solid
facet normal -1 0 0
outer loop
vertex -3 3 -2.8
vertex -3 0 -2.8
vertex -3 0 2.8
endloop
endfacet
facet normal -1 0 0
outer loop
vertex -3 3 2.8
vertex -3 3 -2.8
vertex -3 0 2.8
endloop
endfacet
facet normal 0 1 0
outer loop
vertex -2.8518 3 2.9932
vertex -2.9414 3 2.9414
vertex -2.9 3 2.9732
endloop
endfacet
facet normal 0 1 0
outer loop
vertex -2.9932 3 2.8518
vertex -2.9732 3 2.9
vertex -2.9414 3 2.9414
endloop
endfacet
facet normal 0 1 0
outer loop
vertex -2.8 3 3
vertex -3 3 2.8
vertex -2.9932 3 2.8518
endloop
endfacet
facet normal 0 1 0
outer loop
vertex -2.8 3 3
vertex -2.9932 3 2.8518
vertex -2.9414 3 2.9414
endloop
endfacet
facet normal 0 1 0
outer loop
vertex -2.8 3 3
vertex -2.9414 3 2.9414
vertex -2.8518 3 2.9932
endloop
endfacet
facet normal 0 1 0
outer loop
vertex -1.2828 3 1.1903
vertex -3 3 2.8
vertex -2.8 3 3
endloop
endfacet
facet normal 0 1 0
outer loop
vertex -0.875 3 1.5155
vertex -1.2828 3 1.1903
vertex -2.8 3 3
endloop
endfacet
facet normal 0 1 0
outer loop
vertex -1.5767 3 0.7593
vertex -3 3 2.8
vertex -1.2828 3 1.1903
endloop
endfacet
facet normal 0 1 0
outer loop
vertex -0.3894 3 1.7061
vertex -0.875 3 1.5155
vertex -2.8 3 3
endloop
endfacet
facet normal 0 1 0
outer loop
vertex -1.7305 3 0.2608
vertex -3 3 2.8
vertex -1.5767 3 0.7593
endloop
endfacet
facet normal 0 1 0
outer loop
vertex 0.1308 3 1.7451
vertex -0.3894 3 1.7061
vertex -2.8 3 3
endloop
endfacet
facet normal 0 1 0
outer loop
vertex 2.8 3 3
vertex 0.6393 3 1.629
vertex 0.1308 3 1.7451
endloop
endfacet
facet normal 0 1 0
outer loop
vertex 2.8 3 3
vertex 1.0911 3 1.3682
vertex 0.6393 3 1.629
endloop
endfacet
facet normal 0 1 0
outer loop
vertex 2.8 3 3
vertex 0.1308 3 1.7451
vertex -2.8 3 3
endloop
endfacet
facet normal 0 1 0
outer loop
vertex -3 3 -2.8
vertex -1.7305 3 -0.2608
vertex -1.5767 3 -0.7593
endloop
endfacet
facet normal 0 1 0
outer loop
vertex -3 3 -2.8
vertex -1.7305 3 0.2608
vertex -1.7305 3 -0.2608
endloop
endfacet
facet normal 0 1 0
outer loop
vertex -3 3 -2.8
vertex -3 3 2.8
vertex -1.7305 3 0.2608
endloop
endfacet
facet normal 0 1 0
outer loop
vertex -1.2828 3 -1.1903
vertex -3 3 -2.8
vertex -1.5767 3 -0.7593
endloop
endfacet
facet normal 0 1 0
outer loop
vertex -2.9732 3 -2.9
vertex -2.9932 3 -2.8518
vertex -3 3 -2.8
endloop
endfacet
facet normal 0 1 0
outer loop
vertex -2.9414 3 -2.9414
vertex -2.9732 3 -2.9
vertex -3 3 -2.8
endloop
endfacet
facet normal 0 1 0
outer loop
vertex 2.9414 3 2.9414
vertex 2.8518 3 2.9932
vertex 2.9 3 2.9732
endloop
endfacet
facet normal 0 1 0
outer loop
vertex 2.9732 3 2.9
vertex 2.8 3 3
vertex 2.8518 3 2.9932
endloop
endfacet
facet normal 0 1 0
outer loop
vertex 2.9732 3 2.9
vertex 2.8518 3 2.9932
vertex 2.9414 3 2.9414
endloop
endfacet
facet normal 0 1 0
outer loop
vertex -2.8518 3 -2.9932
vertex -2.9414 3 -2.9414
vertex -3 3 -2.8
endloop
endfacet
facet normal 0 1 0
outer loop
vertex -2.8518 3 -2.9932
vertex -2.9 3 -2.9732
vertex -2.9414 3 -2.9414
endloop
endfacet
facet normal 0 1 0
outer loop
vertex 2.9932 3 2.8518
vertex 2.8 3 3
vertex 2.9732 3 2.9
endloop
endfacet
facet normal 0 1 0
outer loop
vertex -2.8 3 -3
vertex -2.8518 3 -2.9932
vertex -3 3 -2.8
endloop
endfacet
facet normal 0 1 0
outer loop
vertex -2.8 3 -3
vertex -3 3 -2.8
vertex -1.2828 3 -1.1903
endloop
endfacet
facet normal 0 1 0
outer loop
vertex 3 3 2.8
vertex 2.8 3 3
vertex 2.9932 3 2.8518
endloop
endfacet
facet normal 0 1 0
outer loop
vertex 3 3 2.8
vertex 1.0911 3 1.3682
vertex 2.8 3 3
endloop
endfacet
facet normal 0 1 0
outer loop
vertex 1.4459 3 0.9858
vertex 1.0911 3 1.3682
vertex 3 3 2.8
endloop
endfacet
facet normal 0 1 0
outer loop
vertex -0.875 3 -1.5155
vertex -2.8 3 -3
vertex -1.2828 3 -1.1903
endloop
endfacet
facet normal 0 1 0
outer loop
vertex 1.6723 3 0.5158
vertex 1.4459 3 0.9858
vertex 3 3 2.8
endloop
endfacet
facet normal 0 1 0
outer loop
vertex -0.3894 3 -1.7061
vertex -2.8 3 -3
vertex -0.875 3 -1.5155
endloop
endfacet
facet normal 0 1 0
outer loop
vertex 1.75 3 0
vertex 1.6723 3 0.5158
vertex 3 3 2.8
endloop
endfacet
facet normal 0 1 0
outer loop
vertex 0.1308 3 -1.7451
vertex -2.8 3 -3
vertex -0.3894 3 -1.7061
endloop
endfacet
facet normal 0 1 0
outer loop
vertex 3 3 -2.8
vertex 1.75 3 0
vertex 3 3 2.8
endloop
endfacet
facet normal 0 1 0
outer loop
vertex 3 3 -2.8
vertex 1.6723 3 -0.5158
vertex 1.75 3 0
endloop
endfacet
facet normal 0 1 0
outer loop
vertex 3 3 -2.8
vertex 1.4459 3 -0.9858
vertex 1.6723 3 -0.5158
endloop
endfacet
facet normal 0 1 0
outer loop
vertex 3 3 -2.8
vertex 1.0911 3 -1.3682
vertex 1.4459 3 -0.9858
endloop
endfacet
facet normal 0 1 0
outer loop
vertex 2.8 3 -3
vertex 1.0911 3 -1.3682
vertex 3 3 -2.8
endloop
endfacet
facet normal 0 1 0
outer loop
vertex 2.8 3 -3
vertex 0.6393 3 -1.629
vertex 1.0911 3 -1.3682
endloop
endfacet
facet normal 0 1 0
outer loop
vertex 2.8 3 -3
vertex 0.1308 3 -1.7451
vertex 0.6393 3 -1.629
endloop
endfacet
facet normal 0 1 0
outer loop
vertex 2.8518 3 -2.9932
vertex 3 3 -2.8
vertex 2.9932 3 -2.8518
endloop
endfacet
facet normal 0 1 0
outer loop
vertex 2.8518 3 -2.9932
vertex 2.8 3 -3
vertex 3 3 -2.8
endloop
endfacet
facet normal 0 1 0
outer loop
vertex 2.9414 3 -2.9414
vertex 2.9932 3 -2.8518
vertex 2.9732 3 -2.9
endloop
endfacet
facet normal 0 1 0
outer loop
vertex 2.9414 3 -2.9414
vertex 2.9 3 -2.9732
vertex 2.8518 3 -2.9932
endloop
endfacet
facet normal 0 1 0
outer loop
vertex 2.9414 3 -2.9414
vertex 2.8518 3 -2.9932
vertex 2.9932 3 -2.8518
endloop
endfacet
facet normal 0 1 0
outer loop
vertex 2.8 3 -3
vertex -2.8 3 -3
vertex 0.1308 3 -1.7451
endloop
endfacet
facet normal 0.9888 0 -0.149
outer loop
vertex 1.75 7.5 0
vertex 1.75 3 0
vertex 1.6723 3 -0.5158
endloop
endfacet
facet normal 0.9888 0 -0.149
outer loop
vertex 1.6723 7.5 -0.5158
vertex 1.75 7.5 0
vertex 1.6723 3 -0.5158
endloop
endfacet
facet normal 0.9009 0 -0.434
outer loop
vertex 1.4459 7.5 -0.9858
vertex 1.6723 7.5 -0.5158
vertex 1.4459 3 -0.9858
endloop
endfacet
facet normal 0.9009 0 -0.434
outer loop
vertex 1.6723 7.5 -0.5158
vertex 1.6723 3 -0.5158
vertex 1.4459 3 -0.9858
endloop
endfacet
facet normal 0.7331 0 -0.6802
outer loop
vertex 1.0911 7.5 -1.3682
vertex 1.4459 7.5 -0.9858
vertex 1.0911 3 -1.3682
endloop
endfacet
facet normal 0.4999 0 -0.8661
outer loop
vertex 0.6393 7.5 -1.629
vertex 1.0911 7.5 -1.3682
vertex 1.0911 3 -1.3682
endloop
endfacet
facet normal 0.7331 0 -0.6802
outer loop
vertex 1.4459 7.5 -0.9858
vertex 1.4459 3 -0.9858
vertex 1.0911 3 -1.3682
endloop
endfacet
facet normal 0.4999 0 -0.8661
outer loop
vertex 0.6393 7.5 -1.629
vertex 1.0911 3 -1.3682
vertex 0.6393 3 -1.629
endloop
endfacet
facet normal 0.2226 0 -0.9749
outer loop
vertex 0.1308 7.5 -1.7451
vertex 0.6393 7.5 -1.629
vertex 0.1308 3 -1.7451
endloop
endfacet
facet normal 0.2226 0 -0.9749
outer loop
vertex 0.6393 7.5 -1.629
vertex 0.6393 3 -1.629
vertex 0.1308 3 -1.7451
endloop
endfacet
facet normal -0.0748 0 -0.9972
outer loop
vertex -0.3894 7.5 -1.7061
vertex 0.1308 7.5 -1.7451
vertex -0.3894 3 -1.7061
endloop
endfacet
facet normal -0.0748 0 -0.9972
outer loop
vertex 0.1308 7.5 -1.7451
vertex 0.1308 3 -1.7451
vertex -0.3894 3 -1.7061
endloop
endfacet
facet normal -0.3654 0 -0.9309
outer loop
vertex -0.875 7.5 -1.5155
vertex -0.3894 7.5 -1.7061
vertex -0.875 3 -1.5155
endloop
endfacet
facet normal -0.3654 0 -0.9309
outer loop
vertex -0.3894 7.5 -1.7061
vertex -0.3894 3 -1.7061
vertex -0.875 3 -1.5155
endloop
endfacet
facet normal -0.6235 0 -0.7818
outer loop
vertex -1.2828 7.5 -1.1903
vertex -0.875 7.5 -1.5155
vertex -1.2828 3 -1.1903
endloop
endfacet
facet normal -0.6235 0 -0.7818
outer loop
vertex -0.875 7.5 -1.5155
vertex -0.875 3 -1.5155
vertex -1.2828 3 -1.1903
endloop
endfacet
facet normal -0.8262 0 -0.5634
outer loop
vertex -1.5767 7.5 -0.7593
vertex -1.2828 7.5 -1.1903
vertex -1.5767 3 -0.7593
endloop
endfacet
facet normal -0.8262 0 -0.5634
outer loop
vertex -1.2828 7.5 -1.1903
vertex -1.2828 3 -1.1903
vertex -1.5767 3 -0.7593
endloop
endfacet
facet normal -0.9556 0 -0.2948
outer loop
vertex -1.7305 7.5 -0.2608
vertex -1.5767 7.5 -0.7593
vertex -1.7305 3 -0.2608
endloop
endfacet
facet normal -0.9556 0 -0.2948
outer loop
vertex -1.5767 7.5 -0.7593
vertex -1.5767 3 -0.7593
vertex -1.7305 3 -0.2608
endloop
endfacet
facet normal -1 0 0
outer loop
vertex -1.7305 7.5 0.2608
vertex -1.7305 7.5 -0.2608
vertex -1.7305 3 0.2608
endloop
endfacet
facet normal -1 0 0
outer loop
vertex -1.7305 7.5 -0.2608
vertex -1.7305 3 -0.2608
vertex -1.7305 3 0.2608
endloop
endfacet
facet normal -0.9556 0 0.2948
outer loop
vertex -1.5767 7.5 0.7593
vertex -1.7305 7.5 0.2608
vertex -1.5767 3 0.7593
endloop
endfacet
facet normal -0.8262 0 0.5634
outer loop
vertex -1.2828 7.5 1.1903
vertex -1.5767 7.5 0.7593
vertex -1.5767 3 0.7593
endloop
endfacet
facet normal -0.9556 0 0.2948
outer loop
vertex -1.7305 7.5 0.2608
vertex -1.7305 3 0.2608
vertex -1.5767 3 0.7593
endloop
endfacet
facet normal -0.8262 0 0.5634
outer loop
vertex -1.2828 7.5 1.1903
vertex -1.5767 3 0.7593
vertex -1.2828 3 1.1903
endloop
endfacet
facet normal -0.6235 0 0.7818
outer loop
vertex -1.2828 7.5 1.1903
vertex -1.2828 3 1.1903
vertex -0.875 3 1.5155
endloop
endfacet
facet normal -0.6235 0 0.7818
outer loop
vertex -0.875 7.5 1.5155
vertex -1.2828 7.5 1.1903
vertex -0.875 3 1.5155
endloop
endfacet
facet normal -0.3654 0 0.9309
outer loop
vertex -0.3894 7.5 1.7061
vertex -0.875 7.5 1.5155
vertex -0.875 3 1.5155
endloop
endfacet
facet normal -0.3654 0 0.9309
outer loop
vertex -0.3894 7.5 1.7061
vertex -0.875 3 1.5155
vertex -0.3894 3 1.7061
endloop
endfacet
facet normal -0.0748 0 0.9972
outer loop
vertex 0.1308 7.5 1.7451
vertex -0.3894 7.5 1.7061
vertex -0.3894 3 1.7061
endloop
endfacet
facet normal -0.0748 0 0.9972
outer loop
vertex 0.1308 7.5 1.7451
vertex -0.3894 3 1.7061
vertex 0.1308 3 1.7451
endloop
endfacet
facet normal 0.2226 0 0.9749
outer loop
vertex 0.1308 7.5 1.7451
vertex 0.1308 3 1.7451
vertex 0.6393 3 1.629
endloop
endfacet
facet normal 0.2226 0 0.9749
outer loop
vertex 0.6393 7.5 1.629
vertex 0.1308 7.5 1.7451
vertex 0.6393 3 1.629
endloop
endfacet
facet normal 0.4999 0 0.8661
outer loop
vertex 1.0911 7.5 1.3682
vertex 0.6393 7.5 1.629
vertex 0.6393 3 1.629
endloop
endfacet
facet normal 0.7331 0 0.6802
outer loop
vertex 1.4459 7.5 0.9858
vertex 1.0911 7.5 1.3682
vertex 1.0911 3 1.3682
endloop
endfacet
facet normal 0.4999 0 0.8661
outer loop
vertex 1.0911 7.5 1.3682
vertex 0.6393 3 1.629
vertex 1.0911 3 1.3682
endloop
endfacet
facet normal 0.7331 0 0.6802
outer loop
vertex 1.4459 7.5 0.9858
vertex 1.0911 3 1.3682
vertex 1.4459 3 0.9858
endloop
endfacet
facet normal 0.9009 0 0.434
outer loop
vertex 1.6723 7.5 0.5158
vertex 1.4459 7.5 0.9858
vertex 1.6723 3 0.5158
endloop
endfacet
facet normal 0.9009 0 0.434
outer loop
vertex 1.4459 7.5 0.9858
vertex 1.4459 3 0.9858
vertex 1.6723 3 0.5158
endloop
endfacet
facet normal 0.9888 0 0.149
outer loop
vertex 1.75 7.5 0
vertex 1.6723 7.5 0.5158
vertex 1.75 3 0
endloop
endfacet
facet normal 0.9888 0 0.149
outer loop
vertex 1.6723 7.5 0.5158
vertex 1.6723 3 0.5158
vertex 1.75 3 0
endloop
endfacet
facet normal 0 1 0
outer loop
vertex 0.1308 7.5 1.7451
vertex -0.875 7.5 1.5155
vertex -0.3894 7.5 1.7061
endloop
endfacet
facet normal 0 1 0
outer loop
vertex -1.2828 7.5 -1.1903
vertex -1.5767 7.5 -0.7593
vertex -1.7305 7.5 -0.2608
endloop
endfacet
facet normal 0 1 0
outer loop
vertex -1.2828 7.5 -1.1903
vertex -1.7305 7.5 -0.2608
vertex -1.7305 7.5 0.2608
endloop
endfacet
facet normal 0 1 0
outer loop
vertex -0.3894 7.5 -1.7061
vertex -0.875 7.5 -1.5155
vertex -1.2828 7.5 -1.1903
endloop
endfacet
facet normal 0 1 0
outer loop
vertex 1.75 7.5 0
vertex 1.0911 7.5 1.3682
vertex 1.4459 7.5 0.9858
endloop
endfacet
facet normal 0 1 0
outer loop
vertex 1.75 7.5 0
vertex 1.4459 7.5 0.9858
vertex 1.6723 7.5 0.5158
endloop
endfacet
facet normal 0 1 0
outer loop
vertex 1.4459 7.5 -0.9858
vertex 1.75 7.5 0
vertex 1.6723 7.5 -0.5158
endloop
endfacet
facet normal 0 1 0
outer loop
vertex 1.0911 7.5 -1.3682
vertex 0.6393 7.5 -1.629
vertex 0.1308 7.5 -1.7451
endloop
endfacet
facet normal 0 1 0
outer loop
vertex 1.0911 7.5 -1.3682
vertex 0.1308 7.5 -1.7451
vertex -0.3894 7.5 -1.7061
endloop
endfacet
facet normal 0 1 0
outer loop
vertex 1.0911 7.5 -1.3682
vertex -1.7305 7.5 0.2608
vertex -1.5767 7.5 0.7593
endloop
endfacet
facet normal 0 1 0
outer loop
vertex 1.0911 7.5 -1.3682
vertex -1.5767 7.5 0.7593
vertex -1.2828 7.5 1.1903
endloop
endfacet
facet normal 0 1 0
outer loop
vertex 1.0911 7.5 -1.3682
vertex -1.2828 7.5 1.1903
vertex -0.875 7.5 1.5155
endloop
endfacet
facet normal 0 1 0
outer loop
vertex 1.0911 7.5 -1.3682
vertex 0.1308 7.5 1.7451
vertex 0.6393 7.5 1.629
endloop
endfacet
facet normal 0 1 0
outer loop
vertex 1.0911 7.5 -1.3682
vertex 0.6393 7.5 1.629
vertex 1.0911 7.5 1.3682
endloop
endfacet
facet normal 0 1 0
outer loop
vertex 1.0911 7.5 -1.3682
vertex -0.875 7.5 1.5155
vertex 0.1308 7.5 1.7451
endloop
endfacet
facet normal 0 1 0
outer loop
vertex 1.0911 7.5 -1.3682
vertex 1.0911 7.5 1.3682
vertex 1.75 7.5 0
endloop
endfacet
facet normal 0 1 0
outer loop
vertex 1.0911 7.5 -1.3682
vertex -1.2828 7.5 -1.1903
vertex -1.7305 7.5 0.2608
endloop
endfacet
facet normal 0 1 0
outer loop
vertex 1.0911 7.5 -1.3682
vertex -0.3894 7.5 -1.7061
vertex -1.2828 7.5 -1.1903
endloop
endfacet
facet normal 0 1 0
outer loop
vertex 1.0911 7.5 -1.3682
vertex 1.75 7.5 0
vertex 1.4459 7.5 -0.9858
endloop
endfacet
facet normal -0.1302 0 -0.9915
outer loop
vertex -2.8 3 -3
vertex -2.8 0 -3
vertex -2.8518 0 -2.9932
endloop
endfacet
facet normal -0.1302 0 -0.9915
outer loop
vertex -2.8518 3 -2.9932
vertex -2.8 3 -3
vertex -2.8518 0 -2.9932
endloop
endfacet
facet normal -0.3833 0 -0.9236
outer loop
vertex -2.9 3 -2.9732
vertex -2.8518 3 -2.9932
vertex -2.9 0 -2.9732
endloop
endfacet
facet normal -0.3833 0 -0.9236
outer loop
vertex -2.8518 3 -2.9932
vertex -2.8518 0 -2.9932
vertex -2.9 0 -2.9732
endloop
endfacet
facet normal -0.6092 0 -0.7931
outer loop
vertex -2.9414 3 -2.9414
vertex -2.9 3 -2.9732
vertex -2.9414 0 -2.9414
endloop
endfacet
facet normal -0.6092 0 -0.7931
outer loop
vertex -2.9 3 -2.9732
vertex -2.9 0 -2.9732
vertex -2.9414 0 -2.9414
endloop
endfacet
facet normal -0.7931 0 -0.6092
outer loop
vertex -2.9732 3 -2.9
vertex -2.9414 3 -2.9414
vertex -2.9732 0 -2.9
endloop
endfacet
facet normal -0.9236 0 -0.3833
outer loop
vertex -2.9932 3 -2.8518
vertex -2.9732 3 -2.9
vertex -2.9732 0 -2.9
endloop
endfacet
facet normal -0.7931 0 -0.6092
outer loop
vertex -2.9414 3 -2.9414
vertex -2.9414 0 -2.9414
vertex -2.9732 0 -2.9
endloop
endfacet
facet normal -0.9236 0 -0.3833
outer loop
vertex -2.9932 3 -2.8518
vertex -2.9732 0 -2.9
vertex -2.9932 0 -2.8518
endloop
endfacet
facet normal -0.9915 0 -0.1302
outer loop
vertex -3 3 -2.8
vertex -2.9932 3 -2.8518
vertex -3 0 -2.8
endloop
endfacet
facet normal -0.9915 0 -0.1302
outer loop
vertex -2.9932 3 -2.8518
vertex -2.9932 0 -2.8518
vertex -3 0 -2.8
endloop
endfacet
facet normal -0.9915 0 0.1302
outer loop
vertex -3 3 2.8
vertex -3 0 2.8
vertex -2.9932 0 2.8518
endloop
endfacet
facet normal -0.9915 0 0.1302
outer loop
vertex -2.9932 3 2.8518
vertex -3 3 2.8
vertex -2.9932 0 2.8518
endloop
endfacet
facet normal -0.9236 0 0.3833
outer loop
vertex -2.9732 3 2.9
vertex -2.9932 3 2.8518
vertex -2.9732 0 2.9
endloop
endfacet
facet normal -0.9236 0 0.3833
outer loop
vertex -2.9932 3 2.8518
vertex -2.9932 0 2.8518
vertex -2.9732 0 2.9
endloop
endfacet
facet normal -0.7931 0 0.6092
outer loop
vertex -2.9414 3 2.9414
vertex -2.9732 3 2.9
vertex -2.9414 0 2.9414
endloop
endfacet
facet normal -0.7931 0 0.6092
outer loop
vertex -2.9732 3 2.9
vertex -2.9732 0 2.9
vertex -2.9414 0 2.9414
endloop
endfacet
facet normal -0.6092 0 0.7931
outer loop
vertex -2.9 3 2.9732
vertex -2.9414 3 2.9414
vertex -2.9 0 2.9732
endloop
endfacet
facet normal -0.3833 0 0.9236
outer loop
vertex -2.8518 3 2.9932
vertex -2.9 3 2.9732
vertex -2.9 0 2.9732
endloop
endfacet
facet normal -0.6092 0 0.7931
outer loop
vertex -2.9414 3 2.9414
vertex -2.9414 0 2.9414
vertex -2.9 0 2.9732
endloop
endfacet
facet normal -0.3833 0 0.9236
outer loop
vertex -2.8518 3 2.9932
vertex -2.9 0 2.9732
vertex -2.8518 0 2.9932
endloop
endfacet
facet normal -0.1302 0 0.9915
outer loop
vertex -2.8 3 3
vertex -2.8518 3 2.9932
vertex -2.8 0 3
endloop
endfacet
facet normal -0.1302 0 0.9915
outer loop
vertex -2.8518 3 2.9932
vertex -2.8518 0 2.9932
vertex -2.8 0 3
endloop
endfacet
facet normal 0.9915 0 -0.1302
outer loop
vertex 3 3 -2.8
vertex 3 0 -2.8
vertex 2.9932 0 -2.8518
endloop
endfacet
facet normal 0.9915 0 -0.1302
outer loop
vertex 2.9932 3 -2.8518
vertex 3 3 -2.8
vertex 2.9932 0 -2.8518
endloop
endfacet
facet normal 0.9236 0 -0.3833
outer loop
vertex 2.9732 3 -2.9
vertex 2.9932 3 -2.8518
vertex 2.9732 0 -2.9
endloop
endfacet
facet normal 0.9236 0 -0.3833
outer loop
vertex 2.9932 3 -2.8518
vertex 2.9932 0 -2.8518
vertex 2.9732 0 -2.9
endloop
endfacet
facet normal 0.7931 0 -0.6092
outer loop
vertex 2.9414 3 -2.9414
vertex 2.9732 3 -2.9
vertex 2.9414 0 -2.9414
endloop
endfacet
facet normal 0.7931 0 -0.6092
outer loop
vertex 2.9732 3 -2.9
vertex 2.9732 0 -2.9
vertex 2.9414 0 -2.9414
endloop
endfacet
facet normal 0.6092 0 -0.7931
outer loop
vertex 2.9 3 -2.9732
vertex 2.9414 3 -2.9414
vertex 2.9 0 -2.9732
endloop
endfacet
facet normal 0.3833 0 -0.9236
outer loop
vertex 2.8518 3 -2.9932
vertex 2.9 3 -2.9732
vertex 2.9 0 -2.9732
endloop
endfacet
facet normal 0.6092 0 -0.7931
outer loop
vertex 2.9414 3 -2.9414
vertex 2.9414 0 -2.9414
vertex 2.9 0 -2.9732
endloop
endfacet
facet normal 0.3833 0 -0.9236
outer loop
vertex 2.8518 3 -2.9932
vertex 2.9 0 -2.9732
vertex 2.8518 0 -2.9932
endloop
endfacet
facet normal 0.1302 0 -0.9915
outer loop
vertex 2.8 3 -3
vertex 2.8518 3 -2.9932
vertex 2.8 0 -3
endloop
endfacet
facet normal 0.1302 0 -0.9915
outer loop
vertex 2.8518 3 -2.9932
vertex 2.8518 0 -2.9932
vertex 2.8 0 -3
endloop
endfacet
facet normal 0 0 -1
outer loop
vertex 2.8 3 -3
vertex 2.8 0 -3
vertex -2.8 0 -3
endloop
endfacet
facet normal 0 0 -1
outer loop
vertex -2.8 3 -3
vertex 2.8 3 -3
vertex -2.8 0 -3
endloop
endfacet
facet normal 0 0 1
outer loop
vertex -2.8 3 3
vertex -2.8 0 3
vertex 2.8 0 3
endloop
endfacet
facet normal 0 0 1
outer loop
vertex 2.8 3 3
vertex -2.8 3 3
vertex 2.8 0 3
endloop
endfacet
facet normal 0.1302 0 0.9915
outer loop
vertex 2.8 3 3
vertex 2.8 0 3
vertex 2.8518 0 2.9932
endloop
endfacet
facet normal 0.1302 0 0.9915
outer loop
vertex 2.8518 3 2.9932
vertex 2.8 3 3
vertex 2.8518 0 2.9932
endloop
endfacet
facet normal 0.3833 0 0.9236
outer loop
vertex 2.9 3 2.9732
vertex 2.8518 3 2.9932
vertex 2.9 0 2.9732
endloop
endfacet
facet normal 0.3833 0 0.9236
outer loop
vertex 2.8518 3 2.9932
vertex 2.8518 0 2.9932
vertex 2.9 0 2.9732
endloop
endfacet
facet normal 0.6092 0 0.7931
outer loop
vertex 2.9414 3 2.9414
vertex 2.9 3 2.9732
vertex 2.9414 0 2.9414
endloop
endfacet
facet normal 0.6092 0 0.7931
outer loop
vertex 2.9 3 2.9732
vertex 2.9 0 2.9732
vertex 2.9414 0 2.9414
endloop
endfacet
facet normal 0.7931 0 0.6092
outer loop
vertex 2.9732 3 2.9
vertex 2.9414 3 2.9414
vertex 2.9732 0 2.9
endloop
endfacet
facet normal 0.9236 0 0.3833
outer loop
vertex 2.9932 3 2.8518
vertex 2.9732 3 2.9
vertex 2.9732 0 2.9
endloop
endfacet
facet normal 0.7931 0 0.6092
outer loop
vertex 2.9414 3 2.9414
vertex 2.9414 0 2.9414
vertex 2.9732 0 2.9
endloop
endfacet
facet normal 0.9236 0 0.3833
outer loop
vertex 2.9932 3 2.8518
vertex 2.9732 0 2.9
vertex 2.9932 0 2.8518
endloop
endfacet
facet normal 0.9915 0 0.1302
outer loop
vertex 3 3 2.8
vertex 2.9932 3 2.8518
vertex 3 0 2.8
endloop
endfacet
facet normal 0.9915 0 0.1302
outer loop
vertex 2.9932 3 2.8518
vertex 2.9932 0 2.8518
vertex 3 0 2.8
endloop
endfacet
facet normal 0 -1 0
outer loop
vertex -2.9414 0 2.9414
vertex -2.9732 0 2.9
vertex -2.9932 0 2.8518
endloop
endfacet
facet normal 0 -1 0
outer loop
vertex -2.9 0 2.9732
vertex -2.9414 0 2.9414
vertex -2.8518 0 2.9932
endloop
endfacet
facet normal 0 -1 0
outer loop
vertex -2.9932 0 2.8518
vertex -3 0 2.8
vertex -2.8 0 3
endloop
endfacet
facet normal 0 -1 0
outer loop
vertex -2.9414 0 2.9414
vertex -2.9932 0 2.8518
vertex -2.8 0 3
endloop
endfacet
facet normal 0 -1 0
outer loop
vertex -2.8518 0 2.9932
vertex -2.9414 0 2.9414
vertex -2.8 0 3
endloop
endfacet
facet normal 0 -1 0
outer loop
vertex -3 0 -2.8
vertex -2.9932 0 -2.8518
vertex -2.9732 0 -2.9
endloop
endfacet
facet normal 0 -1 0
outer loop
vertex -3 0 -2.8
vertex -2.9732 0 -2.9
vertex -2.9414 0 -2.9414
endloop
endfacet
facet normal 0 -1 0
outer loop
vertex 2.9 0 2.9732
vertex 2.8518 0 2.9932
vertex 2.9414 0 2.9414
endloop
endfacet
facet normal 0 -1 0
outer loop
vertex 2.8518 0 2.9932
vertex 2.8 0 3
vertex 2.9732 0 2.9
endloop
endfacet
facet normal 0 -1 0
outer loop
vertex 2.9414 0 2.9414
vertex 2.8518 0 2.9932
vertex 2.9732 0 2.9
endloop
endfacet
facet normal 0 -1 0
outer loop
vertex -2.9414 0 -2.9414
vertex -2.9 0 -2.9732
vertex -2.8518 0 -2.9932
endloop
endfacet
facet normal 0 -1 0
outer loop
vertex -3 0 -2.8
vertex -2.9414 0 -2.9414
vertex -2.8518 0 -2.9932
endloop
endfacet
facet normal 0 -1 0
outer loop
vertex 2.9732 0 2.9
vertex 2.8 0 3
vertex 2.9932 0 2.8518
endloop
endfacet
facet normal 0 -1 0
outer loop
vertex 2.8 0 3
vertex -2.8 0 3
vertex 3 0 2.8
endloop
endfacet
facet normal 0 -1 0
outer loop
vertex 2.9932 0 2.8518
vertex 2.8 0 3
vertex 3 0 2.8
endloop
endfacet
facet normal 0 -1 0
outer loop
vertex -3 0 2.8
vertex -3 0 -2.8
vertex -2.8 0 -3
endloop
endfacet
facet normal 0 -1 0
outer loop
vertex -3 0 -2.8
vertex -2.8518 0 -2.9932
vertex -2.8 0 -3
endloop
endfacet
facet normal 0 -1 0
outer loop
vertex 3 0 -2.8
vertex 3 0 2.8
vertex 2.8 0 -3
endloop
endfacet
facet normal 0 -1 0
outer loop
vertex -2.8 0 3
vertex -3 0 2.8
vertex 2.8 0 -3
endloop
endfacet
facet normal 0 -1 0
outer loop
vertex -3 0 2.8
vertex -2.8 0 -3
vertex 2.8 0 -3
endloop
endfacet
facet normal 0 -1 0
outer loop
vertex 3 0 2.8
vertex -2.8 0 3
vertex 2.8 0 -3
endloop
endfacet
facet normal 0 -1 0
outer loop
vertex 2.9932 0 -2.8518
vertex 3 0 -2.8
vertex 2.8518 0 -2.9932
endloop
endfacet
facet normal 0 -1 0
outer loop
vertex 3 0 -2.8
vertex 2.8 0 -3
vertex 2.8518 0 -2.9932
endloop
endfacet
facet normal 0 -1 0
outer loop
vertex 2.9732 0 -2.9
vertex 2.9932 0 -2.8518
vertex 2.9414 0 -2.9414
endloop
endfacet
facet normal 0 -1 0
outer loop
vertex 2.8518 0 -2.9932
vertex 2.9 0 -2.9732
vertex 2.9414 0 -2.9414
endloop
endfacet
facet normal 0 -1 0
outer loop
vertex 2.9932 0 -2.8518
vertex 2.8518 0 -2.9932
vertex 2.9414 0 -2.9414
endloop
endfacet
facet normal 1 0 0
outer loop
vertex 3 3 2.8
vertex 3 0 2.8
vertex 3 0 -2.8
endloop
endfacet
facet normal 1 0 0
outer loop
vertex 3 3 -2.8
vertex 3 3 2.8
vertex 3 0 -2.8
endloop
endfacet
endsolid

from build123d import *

# Parameters (mm, degrees)
EXTRUDE_1_DEPTH = 3
SKETCH_2_R      = 1.75
EXTRUDE_2_DEPTH = 4.5


with BuildPart() as part:
    # 草图1 → 凸台-拉伸1 (new body)
    with BuildSketch(Plane(origin=(0, 0, 0), x_dir=(1, 0, 0), z_dir=(0, 1, 0))):
        with BuildLine():
            Line((-2.8, -3), (2.8, -3))
            ThreePointArc((2.8, -3), (2.941421356, -2.941421356), (3, -2.8))
            Line((3, -2.8), (3, 2.8))
            ThreePointArc((3, 2.8), (2.941421356, 2.941421356), (2.8, 3))
            Line((2.8, 3), (-2.8, 3))
            ThreePointArc((-2.8, 3), (-2.941421356, 2.941421356), (-3, 2.8))
            Line((-3, 2.8), (-3, -2.8))
            ThreePointArc((-3, -2.8), (-2.941421356, -2.941421356), (-2.8, -3))
        make_face()
    extrude(amount=EXTRUDE_1_DEPTH)

    # 草图2 → 凸台-拉伸2 (add)
    with BuildSketch(Plane(origin=(0, 3, 0), x_dir=(1, 0, 0), z_dir=(0, 1, 0))):
        Circle(SKETCH_2_R)
    extrude(amount=EXTRUDE_2_DEPTH)


solid = part.part
